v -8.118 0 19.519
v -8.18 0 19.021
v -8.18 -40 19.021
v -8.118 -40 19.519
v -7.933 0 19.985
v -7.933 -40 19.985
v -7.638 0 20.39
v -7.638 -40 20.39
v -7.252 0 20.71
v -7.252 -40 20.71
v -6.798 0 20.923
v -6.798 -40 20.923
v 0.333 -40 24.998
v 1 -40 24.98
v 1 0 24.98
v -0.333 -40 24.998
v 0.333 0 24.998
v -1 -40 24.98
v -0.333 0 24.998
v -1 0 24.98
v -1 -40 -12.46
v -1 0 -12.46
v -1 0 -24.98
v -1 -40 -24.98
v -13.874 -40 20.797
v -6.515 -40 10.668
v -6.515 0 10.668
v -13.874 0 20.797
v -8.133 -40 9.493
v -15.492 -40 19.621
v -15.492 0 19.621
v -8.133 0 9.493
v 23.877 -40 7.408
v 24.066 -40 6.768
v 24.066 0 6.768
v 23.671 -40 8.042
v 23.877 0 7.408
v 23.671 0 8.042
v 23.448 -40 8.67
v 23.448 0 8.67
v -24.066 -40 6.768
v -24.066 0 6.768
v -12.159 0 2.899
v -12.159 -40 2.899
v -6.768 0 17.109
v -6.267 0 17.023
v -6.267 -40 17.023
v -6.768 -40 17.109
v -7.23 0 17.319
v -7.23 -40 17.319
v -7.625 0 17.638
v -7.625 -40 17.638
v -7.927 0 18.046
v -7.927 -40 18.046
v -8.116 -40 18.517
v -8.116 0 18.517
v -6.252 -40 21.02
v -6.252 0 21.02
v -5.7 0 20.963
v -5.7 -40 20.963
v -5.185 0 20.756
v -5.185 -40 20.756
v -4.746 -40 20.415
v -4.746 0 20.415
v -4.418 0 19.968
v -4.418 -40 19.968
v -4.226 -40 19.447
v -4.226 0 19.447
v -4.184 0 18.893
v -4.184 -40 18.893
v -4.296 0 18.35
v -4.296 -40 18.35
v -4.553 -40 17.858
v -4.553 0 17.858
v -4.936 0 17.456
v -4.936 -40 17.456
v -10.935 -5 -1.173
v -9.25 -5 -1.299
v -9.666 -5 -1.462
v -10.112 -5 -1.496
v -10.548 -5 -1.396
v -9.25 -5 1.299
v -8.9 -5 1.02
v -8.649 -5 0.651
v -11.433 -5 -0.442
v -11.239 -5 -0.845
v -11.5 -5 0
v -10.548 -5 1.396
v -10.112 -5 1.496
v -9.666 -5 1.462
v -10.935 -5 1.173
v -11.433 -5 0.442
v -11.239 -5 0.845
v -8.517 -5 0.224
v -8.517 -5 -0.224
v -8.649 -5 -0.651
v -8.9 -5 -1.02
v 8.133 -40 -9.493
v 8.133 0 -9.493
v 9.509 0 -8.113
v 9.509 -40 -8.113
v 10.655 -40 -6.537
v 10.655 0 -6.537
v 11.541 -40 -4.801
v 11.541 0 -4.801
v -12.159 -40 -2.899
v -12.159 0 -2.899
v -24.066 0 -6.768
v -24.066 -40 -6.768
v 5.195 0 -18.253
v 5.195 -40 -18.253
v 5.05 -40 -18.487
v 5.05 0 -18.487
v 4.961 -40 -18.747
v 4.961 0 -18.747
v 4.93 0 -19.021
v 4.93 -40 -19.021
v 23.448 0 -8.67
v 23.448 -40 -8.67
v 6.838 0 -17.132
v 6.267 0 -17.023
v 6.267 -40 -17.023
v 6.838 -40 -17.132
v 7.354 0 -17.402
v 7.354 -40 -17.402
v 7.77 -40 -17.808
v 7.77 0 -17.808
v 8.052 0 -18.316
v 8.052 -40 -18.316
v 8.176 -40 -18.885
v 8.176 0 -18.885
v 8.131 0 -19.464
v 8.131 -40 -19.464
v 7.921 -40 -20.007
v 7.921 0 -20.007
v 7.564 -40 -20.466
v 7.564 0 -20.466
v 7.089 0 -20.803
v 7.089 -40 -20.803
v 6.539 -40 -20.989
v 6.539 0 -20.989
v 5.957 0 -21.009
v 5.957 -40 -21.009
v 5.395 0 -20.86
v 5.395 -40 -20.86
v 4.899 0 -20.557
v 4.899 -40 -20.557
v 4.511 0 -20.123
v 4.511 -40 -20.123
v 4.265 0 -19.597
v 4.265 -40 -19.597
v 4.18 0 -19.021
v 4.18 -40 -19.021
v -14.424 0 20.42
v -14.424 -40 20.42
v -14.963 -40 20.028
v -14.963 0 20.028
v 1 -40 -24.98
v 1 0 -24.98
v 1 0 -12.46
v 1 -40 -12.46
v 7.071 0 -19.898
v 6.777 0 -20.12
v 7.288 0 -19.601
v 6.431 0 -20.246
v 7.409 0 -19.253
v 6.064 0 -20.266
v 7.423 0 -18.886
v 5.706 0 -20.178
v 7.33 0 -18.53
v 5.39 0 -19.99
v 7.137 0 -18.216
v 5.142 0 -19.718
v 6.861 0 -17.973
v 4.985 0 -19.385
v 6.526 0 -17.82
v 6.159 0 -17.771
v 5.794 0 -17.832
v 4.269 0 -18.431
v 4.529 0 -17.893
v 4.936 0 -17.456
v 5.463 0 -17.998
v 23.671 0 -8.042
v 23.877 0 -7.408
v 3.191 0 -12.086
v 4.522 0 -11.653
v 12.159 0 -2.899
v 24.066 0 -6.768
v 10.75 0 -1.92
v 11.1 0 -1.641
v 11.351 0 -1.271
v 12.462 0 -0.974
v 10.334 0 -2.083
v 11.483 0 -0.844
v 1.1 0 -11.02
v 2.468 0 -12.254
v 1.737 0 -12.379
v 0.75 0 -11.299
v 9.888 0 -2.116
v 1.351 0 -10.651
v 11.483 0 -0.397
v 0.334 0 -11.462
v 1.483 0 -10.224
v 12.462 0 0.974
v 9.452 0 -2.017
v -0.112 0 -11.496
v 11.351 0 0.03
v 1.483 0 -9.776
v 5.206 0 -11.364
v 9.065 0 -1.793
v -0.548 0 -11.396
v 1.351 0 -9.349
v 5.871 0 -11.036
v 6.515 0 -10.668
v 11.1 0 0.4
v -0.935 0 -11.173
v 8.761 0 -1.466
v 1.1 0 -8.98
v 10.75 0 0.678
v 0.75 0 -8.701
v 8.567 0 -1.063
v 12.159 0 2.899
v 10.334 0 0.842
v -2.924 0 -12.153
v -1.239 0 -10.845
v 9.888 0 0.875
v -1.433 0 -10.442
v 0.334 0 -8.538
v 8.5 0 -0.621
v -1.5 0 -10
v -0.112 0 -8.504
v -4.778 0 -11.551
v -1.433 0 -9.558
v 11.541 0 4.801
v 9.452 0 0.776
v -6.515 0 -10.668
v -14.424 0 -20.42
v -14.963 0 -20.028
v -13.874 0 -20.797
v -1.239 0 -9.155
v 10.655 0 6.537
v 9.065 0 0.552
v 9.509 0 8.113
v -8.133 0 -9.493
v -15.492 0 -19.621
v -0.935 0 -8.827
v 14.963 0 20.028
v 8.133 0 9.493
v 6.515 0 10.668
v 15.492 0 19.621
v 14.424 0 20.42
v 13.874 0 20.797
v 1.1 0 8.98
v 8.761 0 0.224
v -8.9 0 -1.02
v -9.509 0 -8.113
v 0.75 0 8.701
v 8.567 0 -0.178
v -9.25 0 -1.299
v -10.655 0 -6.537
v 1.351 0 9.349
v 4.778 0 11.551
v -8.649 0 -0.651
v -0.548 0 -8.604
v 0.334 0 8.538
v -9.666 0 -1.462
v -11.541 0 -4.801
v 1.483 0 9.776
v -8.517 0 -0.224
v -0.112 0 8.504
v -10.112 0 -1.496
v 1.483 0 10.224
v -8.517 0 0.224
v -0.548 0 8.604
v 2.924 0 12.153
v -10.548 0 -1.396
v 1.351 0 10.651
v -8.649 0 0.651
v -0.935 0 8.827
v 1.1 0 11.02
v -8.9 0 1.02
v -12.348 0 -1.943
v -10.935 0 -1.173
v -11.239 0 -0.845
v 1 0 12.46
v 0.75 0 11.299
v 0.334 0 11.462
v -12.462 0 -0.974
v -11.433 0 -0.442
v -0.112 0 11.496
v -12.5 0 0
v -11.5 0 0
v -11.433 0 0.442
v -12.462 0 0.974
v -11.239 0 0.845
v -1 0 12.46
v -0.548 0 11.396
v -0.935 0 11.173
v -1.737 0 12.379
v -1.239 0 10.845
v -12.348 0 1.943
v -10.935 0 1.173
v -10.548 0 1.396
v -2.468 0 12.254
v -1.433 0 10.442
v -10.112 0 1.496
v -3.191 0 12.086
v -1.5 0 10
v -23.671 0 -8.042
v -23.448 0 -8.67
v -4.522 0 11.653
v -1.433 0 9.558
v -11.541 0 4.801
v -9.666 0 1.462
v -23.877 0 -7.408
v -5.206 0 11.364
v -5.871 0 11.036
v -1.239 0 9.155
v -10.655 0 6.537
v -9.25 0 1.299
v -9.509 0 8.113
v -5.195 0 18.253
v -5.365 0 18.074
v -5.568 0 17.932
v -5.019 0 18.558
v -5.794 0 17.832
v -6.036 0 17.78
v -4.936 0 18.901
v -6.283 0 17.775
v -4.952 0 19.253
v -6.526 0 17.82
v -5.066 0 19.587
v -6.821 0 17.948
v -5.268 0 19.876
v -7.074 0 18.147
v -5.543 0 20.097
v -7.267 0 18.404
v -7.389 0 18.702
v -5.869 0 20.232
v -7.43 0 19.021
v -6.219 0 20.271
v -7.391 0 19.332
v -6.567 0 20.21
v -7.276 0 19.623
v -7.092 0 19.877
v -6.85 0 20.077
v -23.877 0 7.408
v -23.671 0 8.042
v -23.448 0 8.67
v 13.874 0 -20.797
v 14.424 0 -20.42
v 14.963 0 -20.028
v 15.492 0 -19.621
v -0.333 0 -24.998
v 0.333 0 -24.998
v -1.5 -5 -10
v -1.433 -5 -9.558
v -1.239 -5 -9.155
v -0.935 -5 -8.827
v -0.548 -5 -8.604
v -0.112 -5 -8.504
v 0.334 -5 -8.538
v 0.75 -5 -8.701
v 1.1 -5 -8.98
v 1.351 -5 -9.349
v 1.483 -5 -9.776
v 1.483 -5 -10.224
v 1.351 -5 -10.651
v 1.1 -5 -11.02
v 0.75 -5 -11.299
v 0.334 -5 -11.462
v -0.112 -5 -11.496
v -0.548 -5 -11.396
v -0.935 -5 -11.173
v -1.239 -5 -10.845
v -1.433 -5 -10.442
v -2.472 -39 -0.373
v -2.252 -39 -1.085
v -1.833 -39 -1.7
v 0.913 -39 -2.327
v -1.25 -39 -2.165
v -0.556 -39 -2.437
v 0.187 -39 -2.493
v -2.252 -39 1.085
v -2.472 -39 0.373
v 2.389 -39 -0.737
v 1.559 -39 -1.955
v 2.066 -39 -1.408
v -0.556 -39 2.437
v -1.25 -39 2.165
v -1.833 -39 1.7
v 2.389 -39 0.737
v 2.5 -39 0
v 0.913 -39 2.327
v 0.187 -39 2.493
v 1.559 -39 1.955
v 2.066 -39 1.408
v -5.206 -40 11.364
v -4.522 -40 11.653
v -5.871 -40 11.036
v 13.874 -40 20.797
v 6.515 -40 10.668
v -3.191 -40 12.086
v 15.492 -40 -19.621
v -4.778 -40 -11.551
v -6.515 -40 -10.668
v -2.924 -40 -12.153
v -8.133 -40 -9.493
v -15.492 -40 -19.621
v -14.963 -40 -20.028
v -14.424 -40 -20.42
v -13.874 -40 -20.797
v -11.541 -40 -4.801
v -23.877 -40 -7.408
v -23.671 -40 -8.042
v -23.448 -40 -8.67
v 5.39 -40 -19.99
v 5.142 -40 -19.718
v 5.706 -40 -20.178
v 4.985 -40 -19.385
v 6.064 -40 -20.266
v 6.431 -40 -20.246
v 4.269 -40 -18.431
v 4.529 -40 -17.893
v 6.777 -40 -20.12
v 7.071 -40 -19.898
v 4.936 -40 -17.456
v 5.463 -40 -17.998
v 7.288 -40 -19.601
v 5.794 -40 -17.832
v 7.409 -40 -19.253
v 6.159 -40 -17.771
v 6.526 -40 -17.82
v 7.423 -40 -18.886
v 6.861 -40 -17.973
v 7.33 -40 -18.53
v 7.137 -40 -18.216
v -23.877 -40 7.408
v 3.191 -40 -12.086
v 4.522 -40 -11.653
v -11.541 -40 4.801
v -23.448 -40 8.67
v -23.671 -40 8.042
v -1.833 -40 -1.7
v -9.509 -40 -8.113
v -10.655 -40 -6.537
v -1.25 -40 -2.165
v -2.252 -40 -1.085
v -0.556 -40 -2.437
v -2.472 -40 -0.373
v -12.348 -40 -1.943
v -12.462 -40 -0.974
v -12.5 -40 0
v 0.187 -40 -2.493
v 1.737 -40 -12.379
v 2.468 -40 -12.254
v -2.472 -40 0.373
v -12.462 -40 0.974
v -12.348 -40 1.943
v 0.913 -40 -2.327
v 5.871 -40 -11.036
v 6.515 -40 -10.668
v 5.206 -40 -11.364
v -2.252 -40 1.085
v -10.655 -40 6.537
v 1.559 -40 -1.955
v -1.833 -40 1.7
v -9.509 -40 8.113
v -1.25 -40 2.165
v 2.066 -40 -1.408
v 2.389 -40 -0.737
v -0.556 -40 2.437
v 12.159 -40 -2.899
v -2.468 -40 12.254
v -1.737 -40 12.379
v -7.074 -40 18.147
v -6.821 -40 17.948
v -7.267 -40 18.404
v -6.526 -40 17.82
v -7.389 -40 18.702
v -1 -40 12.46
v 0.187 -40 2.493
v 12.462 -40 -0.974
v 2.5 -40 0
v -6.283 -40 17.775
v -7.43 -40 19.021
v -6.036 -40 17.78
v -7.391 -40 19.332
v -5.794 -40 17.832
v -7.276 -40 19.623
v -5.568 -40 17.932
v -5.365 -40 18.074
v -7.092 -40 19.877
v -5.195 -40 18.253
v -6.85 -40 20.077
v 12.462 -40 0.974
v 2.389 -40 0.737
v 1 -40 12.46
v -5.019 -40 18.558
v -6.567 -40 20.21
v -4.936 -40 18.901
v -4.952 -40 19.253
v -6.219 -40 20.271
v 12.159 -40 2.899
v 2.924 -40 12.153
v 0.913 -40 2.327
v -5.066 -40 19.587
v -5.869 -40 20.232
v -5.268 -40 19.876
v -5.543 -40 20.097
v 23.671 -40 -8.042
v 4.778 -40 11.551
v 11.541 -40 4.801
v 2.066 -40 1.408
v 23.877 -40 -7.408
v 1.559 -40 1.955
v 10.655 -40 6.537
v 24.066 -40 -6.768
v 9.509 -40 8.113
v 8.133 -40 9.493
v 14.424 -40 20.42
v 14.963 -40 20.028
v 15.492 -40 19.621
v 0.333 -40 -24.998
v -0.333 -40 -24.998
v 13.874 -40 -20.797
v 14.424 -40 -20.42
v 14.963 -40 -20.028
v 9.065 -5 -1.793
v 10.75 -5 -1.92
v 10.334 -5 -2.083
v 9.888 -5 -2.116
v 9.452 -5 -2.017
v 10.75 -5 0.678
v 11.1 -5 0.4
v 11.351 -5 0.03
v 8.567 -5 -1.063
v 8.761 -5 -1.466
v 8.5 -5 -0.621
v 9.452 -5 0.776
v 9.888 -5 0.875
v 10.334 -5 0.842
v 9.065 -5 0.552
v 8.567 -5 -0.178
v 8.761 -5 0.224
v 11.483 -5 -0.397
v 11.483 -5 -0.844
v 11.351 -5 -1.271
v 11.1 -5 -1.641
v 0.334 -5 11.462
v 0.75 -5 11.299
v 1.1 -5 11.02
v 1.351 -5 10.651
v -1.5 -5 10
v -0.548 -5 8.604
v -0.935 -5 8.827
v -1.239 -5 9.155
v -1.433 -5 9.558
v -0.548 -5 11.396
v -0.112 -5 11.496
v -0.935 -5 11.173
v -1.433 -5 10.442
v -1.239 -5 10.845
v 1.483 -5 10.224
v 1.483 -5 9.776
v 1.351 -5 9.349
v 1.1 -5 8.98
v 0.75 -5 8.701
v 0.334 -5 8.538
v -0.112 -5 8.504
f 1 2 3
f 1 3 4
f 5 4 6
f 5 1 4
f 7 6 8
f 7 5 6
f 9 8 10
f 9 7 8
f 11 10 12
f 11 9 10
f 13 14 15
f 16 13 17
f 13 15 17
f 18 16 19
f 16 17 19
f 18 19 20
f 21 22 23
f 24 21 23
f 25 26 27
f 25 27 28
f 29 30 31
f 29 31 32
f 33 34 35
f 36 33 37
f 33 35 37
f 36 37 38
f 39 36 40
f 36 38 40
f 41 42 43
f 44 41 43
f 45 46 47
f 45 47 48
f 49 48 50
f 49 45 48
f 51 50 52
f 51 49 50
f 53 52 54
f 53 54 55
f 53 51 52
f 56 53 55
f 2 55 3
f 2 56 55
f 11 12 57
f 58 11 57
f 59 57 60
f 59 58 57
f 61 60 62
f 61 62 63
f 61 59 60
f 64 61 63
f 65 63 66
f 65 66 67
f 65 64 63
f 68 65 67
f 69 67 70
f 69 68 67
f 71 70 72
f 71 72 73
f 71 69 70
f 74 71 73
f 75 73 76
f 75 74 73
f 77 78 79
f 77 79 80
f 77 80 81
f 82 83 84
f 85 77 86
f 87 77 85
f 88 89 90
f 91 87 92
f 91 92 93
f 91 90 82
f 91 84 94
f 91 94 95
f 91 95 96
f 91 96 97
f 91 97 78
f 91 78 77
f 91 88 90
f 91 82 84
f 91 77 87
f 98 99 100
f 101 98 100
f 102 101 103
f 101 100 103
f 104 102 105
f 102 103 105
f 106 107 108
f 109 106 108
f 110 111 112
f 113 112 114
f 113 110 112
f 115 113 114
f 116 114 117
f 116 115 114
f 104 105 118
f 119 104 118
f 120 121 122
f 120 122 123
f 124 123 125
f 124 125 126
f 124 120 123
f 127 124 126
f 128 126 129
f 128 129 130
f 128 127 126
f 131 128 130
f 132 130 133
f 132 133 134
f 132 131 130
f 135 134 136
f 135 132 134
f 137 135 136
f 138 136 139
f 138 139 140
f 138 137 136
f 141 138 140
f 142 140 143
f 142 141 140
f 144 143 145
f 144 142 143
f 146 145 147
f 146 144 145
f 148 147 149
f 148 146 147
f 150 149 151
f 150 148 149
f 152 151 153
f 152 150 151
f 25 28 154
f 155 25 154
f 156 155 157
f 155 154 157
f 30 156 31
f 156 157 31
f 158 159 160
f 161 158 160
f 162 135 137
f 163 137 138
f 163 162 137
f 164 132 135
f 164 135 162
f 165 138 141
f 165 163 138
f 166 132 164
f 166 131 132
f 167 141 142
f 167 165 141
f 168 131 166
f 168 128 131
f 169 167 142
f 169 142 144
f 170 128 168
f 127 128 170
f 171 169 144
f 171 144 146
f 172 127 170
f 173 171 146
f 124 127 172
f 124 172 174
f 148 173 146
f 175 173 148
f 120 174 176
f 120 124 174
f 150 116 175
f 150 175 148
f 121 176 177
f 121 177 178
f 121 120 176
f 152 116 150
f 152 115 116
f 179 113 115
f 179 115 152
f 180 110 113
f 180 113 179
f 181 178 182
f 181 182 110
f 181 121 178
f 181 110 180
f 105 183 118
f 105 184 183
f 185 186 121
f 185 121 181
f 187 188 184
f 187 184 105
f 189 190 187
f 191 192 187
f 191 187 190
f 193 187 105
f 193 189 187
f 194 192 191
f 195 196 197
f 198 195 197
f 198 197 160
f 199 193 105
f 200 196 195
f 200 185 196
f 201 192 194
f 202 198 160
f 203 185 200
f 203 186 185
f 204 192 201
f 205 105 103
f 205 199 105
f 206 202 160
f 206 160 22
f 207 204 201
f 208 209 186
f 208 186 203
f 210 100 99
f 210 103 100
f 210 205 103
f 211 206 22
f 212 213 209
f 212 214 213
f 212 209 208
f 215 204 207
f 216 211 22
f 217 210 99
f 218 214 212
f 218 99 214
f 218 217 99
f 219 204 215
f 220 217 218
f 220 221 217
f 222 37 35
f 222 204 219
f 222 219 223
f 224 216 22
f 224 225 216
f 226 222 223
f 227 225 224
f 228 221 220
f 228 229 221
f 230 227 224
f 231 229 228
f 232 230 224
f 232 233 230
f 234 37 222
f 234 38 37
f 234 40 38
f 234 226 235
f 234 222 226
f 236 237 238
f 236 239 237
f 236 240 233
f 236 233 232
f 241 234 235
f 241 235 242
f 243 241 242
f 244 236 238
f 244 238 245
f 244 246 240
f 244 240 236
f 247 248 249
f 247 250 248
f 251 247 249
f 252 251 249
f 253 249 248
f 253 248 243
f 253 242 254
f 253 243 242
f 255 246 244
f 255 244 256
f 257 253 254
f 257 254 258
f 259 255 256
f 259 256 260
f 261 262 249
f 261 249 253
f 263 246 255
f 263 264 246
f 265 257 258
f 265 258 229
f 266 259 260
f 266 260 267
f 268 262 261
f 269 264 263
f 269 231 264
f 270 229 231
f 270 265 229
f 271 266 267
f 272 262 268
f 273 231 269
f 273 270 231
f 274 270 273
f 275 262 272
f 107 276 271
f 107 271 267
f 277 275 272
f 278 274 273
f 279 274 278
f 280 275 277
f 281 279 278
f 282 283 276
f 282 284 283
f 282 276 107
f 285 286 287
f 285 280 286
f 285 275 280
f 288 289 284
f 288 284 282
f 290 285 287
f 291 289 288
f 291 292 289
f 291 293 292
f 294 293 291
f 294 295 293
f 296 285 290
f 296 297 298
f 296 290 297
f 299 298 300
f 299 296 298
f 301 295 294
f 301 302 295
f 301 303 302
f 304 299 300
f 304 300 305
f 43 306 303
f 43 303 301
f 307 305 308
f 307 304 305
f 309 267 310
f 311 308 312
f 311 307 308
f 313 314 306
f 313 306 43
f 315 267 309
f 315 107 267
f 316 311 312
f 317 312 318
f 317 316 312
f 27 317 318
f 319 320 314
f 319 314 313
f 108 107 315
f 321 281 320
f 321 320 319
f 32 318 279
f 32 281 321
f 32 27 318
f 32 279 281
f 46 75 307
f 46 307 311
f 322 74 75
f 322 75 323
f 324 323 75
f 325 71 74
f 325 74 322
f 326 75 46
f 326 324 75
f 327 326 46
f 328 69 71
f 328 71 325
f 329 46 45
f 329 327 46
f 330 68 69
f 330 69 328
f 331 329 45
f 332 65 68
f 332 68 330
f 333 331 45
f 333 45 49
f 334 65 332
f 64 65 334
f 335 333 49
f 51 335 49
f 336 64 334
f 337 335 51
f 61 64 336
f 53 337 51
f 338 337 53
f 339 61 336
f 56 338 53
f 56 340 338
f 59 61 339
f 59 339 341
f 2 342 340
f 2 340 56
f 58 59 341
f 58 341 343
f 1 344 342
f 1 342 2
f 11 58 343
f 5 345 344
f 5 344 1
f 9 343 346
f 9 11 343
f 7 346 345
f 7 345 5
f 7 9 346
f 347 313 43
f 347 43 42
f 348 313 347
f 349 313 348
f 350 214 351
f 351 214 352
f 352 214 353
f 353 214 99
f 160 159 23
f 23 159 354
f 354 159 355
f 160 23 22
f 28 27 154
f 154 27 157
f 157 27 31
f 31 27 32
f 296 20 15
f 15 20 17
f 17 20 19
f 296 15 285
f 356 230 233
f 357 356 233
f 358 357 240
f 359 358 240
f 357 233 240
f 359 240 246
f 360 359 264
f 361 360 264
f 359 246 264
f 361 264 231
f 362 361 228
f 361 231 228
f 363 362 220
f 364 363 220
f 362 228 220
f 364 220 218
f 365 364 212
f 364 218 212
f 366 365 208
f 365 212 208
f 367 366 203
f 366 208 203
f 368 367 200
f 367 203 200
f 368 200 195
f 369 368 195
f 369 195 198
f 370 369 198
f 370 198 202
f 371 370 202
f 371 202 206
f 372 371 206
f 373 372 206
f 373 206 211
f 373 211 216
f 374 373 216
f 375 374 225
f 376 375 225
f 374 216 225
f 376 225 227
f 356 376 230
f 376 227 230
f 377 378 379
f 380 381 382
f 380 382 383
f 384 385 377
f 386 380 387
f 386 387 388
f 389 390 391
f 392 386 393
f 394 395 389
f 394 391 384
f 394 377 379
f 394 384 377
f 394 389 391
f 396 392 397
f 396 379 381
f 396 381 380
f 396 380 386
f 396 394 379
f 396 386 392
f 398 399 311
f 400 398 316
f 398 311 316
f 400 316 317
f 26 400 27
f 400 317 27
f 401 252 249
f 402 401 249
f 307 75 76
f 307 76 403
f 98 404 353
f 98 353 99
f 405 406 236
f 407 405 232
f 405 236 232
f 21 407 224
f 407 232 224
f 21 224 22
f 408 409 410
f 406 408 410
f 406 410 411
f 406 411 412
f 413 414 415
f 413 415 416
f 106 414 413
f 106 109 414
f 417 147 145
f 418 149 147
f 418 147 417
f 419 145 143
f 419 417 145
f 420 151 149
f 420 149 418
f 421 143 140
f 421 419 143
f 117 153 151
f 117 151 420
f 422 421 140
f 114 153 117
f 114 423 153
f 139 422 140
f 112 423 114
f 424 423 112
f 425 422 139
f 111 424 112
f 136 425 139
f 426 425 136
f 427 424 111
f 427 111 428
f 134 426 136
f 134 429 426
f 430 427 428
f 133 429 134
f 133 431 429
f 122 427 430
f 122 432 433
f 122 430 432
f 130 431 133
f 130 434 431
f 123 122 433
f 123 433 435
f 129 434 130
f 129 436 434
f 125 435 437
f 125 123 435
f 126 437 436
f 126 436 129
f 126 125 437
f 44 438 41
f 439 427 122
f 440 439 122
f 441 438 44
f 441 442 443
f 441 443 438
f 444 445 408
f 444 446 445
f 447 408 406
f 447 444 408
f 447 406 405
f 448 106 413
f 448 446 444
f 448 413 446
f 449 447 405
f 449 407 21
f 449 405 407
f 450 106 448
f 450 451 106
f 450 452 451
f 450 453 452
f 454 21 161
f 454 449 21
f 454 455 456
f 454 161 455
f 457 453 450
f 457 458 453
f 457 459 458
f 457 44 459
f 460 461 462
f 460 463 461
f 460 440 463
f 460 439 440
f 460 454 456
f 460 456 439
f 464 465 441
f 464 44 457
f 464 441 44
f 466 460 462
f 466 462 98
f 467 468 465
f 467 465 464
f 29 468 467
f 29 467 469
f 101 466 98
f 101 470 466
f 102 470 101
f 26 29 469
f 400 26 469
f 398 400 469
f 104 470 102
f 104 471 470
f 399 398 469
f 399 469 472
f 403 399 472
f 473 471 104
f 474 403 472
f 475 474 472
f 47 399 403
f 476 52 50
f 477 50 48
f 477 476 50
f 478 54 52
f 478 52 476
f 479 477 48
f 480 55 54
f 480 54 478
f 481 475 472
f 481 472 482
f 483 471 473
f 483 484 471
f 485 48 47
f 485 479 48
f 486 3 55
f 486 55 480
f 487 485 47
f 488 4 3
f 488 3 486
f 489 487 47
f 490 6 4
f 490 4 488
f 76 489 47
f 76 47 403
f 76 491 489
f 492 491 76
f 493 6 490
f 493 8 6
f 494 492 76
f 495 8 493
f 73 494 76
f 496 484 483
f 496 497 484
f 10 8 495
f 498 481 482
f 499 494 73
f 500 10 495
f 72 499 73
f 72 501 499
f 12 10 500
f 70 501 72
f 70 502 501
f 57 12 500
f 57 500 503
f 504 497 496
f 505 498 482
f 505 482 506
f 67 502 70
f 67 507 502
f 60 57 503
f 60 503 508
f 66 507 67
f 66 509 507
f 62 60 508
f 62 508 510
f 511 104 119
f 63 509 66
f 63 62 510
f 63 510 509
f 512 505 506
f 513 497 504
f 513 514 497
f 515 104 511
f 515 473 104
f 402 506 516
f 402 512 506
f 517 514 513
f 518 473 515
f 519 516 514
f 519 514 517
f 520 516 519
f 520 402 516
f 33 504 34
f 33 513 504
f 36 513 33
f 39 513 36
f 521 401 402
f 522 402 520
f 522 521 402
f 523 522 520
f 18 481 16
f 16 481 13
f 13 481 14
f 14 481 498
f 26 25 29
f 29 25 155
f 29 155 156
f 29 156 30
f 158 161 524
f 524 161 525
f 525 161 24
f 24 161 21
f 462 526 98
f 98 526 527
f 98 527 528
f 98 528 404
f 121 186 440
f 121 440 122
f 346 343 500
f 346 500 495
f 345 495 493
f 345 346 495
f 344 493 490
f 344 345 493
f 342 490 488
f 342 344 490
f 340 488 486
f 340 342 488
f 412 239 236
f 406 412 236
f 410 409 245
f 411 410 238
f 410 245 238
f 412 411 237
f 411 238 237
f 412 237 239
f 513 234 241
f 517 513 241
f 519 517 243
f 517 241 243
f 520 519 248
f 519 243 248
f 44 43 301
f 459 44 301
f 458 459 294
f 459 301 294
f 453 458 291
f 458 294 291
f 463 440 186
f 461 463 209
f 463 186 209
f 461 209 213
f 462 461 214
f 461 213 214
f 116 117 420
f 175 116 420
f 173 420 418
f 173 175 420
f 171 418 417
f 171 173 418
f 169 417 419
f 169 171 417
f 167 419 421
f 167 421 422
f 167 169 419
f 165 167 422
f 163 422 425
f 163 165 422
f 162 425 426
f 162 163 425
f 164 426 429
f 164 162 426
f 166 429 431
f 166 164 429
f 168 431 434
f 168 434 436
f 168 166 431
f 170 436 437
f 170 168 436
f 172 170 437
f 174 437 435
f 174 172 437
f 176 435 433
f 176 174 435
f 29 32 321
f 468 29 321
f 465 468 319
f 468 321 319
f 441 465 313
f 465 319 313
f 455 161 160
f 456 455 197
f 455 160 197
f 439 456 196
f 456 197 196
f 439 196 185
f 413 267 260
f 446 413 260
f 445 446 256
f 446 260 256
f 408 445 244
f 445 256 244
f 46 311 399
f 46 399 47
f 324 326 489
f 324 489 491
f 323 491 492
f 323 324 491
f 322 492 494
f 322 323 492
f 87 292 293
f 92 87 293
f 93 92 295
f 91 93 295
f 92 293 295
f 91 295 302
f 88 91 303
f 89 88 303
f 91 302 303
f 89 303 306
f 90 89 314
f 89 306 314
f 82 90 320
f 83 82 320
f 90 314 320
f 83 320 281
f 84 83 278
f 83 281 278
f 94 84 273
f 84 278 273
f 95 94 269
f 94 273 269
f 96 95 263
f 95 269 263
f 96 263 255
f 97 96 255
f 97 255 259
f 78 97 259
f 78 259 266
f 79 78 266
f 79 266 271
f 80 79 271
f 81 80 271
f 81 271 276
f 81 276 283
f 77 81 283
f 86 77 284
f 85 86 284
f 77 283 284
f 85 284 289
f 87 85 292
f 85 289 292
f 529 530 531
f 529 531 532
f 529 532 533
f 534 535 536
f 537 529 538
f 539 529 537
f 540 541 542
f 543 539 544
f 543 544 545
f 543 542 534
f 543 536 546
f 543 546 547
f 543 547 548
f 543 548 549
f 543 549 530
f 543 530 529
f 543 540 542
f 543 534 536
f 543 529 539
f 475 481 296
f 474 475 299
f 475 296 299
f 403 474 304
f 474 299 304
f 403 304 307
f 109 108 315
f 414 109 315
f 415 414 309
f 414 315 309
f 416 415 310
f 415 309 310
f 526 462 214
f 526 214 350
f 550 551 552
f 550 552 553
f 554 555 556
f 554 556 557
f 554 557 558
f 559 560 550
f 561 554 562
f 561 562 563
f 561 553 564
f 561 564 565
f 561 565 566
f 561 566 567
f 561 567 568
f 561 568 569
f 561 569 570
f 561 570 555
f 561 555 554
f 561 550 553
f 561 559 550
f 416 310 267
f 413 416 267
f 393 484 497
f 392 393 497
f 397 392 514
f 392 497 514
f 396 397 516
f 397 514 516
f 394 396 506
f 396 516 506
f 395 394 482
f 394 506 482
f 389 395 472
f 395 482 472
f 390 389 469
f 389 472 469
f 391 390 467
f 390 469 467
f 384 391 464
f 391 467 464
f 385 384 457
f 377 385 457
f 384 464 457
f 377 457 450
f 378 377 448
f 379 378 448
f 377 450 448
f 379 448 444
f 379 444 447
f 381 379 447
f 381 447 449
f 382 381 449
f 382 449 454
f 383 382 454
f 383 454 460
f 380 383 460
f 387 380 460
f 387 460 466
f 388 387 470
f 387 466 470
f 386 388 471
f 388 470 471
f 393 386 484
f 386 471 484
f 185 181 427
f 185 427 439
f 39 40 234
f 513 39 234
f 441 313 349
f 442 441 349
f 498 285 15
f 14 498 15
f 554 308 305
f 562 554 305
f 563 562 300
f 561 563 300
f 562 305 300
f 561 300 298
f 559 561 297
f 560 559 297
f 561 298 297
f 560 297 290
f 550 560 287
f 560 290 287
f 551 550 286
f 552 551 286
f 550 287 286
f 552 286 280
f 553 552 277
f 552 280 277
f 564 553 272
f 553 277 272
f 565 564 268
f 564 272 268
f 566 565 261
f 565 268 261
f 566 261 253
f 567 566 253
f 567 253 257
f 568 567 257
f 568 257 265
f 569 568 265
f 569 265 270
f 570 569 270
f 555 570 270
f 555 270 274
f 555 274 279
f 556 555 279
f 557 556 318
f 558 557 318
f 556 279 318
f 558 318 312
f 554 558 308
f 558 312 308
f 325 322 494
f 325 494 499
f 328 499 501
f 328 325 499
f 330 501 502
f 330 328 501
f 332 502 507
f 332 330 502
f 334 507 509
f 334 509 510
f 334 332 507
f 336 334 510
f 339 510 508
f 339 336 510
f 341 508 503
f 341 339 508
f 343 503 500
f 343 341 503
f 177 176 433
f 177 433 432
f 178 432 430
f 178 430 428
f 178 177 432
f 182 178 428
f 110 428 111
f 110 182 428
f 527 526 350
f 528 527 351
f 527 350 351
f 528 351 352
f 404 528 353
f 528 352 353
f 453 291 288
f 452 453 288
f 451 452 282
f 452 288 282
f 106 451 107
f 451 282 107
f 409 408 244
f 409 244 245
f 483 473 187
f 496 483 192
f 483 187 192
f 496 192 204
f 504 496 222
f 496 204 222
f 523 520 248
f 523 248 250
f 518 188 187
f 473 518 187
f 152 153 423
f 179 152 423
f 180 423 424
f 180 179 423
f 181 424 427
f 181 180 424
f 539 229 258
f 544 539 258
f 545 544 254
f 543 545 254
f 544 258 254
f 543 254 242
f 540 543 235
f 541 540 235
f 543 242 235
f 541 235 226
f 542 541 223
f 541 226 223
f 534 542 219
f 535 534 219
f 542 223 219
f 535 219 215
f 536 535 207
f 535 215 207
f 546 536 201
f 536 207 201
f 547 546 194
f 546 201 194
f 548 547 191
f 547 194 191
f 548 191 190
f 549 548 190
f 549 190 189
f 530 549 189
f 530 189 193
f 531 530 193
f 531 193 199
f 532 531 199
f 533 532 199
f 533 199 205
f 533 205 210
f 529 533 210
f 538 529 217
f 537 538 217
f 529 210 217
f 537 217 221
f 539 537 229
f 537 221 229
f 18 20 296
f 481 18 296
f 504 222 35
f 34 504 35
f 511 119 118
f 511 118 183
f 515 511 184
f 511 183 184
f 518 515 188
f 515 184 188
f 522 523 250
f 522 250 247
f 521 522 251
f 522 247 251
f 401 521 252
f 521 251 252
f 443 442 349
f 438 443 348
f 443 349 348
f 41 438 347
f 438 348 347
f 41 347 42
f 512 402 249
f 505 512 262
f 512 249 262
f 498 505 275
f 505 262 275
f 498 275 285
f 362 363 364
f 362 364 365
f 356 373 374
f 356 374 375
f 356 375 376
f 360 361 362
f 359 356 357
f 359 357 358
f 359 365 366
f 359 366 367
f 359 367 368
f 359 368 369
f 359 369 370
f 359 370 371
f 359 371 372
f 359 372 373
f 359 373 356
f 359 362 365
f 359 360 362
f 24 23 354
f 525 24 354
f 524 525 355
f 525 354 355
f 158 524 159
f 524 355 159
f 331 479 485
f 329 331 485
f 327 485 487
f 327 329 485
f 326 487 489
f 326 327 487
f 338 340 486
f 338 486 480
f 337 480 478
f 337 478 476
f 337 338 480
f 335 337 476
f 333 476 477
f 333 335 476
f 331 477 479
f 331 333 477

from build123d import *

# Parameters (mm, degrees)
F0_R      = 25
F1_DEPTH  = 40
F2_R      = 2.5
F3_DEPTH  = 1
F5_DEPTH  = 40.001
F7_DEPTH  = 40
F8_R      = 2.5
F9_DEPTH  = 1
F10_R     = 1.5
F11_DEPTH = 5


with BuildPart() as f1:
    # F0 (on Front) → F1 (new body)
    with BuildSketch(Plane.XZ):
        Circle(F0_R)
    extrude(amount=F1_DEPTH)

    # F2 (on face) → F3 (cut)
    with BuildSketch(Plane(origin=(0, 0, 0), x_dir=(-1, 0, 0), z_dir=(0, 1, 0))):
        Circle(F2_R)
    extrude(amount=-F3_DEPTH, mode=Mode.SUBTRACT)

    # F4 (on face) → F5 (cut, through all)
    with BuildSketch(Plane(origin=(0, 0, 0), x_dir=(-1, 0, 0), z_dir=(0, 1, 0))):
        with BuildLine():
            ThreePointArc((8.1327834988, 9.4925145542), (10.1127124297, 7.3473156537), (11.5410861355, 4.8013884256))
            Line((11.5410861355, 4.8013884256), (23.4483671681, 8.6702985617))
            ThreePointArc((23.4483671681, 8.6702985617), (20.2254248594, 14.6946313073), (15.4918878906, 19.6214527899))
            Line((15.4918878906, 19.6214527899), (8.1327834988, 9.4925145542))
        make_face()
        with BuildLine():
            ThreePointArc((1, 12.4599357944), (3.8627124297, 11.8882064537), (6.5147495101, 10.6680850588))
            Line((6.5147495101, 10.6680850588), (13.8738539018, 20.7970232945))
            ThreePointArc((13.8738539018, 20.7970232945), (7.7254248594, 23.7764129074), (1, 24.9799919936))
            Line((1, 24.9799919936), (1, 12.4599357944))
        make_face()
        with BuildLine():
            ThreePointArc((-6.5147495101, 10.6680850588), (-3.8627124297, 11.8882064537), (-1, 12.4599357944))
            Line((-1, 12.4599357944), (-1, 24.9799919936))
            ThreePointArc((-1, 24.9799919936), (-7.7254248594, 23.7764129074), (-13.8738539018, 20.7970232945))
            Line((-13.8738539018, 20.7970232945), (-6.5147495101, 10.6680850588))
        make_face()
        with BuildLine():
            ThreePointArc((-11.5410861355, 4.8013884256), (-10.1127124297, 7.3473156537), (-8.1327834988, 9.4925145542))
            Line((-8.1327834988, 9.4925145542), (-15.4918878906, 19.6214527899))
            ThreePointArc((-15.4918878906, 19.6214527899), (-20.2254248594, 14.6946313073), (-23.4483671681, 8.6702985617))
            Line((-23.4483671681, 8.6702985617), (-11.5410861355, 4.8013884256))
        make_face()
        with BuildLine():
            ThreePointArc((-12.1591201242, -2.899275393), (-12.5, 0), (-12.1591201242, 2.899275393))
            Line((-12.1591201242, 2.899275393), (-24.0664011569, 6.7681855291))
            ThreePointArc((-24.0664011569, 6.7681855291), (-25, 0), (-24.0664011569, -6.7681855291))
            Line((-24.0664011569, -6.7681855291), (-12.1591201242, -2.899275393))
        make_face()
        with BuildLine():
            Line((-15.4918878906, -19.6214527899), (-8.1327834988, -9.4925145542))
            ThreePointArc((-8.1327834988, -9.4925145542), (-10.1127124297, -7.3473156537), (-11.5410861355, -4.8013884256))
            Line((-11.5410861355, -4.8013884256), (-23.4483671681, -8.6702985617))
            ThreePointArc((-23.4483671681, -8.6702985617), (-20.2254248594, -14.6946313073), (-15.4918878906, -19.6214527899))
        make_face()
        with BuildLine():
            Line((-1, -24.9799919936), (-1, -12.4599357944))
            ThreePointArc((-1, -12.4599357944), (-3.8627124297, -11.8882064537), (-6.5147495101, -10.6680850588))
            Line((-6.5147495101, -10.6680850588), (-13.8738539018, -20.7970232945))
            ThreePointArc((-13.8738539018, -20.7970232945), (-7.7254248594, -23.7764129074), (-1, -24.9799919936))
        make_face()
        with BuildLine():
            Line((13.8738539018, -20.7970232945), (6.5147495101, -10.6680850588))
            ThreePointArc((6.5147495101, -10.6680850588), (3.8627124297, -11.8882064537), (1, -12.4599357944))
            Line((1, -12.4599357944), (1, -24.9799919936))
            ThreePointArc((1, -24.9799919936), (7.7254248594, -23.7764129074), (13.8738539018, -20.7970232945))
        make_face()
        with BuildLine():
            Line((23.4483671681, -8.6702985617), (11.5410861355, -4.8013884256))
            ThreePointArc((11.5410861355, -4.8013884256), (10.1127124297, -7.3473156537), (8.1327834988, -9.4925145542))
            Line((8.1327834988, -9.4925145542), (15.4918878906, -19.6214527899))
            ThreePointArc((15.4918878906, -19.6214527899), (20.2254248594, -14.6946313073), (23.4483671681, -8.6702985617))
        make_face()
        with BuildLine():
            ThreePointArc((12.1591201242, 2.899275393), (12.4144875358, 1.4596229731), (12.5, 0))
            ThreePointArc((12.5, 0), (12.4144875358, -1.4596229731), (12.1591201242, -2.899275393))
            Line((12.1591201242, -2.899275393), (24.0664011569, -6.7681855291))
            ThreePointArc((24.0664011569, -6.7681855291), (24.7655004888, -3.4161360539), (25, 0))
            ThreePointArc((25, 0), (24.7655004888, 3.4161360539), (24.0664011569, 6.7681855291))
            Line((24.0664011569, 6.7681855291), (12.1591201242, 2.899275393))
        make_face()
    extrude(amount=-F5_DEPTH, mode=Mode.SUBTRACT)

    # F6 (on face) → F7 (join)
    with BuildSketch(Plane(origin=(0, 0, 0), x_dir=(-1, 0, 0), z_dir=(0, 1, 0))):
        with BuildLine():
            ThreePointArc((2.5, 0), (2.0225424859, 1.4694631307), (0.7725424859, 2.3776412907))
            ThreePointArc((0.7725424859, 2.3776412907), (-2.0225424859, -1.4694631307), (2.5, 0))
        make_face()
        with BuildLine():
            ThreePointArc((-3.1909113793, -12.0858630048), (-3.8627124297, -11.8882064537), (-4.5223905021, -11.6532392126))
            Line((-4.5223905021, -11.6532392126), (-6.2671362955, -17.0230146177))
            ThreePointArc((-6.2671362955, -17.0230146177), (-5.5623058987, -17.1190172933), (-4.9356571727, -17.4556384098))
            Line((-4.9356571727, -17.4556384098), (-3.1909113793, -12.0858630048))
        make_face()
        with BuildLine():
            Line((-6.5260565798, -17.819889314), (-6.2671362955, -17.0230146177))
            ThreePointArc((-6.2671362955, -17.0230146177), (-7.5635259169, -20.465705145), (-4.1803398875, -19.0211303259))
            ThreePointArc((-4.1803398875, -19.0211303259), (-4.379039603, -18.1520404081), (-4.9356571727, -17.4556384098))
            Line((-4.9356571727, -17.4556384098), (-5.194577457, -18.2525131061))
            ThreePointArc((-5.194577457, -18.2525131061), (-4.9982436481, -18.6147456794), (-4.9303398875, -19.0211303259))
            ThreePointArc((-4.9303398875, -19.0211303259), (-6.9321224806, -20.0197908952), (-6.5260565798, -17.819889314))
        make_face()
        with BuildLine():
            ThreePointArc((3.1909113793, 12.0858630048), (3.5281963151, 11.9917401057), (3.8627124297, 11.8882064537))
            Line((3.8627124297, 11.8882064537), (5.5623058987, 17.1190172933))
            ThreePointArc((5.5623058987, 17.1190172933), (5.233895582, 17.2592440706), (4.9356571727, 17.4556384098))
            Line((4.9356571727, 17.4556384098), (3.1909113793, 12.0858630048))
        make_face()
        with BuildLine():
            Line((5.5623058987, 17.1190172933), (3.8627124297, 11.8882064537))
            ThreePointArc((3.8627124297, 11.8882064537), (4.1941972051, 11.7753432988), (4.5223905021, 11.6532392126))
            Line((4.5223905021, 11.6532392126), (6.2671362955, 17.0230146177))
            ThreePointArc((6.2671362955, 17.0230146177), (5.9104186578, 17.0394283983), (5.5623058987, 17.1190172933))
        make_face()
        with BuildLine():
            ThreePointArc((6.7983738762, 20.9232433585), (4.4184536322, 19.9675746314), (4.9356571727, 17.4556384098))
            Line((4.9356571727, 17.4556384098), (5.194577457, 18.2525131061))
            ThreePointArc((5.194577457, 18.2525131061), (5.1567490659, 19.7385993706), (6.5666111305, 20.2099509713))
            Line((6.5666111305, 20.2099509713), (6.7983738762, 20.9232433585))
        make_face()
        with BuildLine():
            Line((6.5260565798, 17.819889314), (6.2671362955, 17.0230146177))
            ThreePointArc((6.2671362955, 17.0230146177), (7.6249147066, 17.6379442965), (8.1803398875, 19.0211303259))
            ThreePointArc((8.1803398875, 19.0211303259), (7.7983738762, 20.1967008305), (6.7983738762, 20.9232433585))
            Line((6.7983738762, 20.9232433585), (6.5666111305, 20.2099509713))
            ThreePointArc((6.5666111305, 20.2099509713), (7.1916111305, 19.7558618913), (7.4303398875, 19.0211303259))
            ThreePointArc((7.4303398875, 19.0211303259), (7.1790004568, 18.2693477328), (6.5260565798, 17.819889314))
        make_face()
        with BuildLine():
            ThreePointArc((-4.9356571727, -17.4556384098), (-5.5623058987, -17.1190172933), (-6.2671362955, -17.0230146177))
            Line((-6.2671362955, -17.0230146177), (-6.5260565798, -17.819889314))
            ThreePointArc((-6.5260565798, -17.819889314), (-5.7940686445, -17.8323096805), (-5.194577457, -18.2525131061))
            Line((-5.194577457, -18.2525131061), (-4.9356571727, -17.4556384098))
        make_face()
        with BuildLine():
            ThreePointArc((4.9356571727, 17.4556384098), (5.233895582, 17.2592440706), (5.5623058987, 17.1190172933))
            Line((5.5623058987, 17.1190172933), (5.7940686445, 17.8323096805))
            ThreePointArc((5.7940686445, 17.8323096805), (5.4628708429, 17.9975395043), (5.194577457, 18.2525131061))
            Line((5.194577457, 18.2525131061), (4.9356571727, 17.4556384098))
        make_face()
        with BuildLine():
            Line((5.7940686445, 17.8323096805), (5.5623058987, 17.1190172933))
            ThreePointArc((5.5623058987, 17.1190172933), (5.9104186578, 17.0394283983), (6.2671362955, 17.0230146177))
            Line((6.2671362955, 17.0230146177), (6.5260565798, 17.819889314))
            ThreePointArc((6.5260565798, 17.819889314), (6.1591329483, 17.7713102326), (5.7940686445, 17.8323096805))
        make_face()
    extrude(amount=-F7_DEPTH)

    # F8 (on face) → F9 (cut)
    with BuildSketch(Plane.XZ.offset(40)):
        Circle(F8_R)
    extrude(amount=-F9_DEPTH, mode=Mode.SUBTRACT)

    # F10 (on face) → F11 (cut)
    with BuildSketch(Plane(origin=(0, 0, 0), x_dir=(-1, 0, 0), z_dir=(0, 1, 0))):
        with Locations((10, 0)):
            Circle(F10_R)
        with Locations((-10, -0.6205414017)):
            Circle(F10_R)
        with Locations((0, -10)):
            Circle(F10_R)
        with Locations((0, 10)):
            Circle(F10_R)
    extrude(amount=-F11_DEPTH, mode=Mode.SUBTRACT)


solid = f1.part
